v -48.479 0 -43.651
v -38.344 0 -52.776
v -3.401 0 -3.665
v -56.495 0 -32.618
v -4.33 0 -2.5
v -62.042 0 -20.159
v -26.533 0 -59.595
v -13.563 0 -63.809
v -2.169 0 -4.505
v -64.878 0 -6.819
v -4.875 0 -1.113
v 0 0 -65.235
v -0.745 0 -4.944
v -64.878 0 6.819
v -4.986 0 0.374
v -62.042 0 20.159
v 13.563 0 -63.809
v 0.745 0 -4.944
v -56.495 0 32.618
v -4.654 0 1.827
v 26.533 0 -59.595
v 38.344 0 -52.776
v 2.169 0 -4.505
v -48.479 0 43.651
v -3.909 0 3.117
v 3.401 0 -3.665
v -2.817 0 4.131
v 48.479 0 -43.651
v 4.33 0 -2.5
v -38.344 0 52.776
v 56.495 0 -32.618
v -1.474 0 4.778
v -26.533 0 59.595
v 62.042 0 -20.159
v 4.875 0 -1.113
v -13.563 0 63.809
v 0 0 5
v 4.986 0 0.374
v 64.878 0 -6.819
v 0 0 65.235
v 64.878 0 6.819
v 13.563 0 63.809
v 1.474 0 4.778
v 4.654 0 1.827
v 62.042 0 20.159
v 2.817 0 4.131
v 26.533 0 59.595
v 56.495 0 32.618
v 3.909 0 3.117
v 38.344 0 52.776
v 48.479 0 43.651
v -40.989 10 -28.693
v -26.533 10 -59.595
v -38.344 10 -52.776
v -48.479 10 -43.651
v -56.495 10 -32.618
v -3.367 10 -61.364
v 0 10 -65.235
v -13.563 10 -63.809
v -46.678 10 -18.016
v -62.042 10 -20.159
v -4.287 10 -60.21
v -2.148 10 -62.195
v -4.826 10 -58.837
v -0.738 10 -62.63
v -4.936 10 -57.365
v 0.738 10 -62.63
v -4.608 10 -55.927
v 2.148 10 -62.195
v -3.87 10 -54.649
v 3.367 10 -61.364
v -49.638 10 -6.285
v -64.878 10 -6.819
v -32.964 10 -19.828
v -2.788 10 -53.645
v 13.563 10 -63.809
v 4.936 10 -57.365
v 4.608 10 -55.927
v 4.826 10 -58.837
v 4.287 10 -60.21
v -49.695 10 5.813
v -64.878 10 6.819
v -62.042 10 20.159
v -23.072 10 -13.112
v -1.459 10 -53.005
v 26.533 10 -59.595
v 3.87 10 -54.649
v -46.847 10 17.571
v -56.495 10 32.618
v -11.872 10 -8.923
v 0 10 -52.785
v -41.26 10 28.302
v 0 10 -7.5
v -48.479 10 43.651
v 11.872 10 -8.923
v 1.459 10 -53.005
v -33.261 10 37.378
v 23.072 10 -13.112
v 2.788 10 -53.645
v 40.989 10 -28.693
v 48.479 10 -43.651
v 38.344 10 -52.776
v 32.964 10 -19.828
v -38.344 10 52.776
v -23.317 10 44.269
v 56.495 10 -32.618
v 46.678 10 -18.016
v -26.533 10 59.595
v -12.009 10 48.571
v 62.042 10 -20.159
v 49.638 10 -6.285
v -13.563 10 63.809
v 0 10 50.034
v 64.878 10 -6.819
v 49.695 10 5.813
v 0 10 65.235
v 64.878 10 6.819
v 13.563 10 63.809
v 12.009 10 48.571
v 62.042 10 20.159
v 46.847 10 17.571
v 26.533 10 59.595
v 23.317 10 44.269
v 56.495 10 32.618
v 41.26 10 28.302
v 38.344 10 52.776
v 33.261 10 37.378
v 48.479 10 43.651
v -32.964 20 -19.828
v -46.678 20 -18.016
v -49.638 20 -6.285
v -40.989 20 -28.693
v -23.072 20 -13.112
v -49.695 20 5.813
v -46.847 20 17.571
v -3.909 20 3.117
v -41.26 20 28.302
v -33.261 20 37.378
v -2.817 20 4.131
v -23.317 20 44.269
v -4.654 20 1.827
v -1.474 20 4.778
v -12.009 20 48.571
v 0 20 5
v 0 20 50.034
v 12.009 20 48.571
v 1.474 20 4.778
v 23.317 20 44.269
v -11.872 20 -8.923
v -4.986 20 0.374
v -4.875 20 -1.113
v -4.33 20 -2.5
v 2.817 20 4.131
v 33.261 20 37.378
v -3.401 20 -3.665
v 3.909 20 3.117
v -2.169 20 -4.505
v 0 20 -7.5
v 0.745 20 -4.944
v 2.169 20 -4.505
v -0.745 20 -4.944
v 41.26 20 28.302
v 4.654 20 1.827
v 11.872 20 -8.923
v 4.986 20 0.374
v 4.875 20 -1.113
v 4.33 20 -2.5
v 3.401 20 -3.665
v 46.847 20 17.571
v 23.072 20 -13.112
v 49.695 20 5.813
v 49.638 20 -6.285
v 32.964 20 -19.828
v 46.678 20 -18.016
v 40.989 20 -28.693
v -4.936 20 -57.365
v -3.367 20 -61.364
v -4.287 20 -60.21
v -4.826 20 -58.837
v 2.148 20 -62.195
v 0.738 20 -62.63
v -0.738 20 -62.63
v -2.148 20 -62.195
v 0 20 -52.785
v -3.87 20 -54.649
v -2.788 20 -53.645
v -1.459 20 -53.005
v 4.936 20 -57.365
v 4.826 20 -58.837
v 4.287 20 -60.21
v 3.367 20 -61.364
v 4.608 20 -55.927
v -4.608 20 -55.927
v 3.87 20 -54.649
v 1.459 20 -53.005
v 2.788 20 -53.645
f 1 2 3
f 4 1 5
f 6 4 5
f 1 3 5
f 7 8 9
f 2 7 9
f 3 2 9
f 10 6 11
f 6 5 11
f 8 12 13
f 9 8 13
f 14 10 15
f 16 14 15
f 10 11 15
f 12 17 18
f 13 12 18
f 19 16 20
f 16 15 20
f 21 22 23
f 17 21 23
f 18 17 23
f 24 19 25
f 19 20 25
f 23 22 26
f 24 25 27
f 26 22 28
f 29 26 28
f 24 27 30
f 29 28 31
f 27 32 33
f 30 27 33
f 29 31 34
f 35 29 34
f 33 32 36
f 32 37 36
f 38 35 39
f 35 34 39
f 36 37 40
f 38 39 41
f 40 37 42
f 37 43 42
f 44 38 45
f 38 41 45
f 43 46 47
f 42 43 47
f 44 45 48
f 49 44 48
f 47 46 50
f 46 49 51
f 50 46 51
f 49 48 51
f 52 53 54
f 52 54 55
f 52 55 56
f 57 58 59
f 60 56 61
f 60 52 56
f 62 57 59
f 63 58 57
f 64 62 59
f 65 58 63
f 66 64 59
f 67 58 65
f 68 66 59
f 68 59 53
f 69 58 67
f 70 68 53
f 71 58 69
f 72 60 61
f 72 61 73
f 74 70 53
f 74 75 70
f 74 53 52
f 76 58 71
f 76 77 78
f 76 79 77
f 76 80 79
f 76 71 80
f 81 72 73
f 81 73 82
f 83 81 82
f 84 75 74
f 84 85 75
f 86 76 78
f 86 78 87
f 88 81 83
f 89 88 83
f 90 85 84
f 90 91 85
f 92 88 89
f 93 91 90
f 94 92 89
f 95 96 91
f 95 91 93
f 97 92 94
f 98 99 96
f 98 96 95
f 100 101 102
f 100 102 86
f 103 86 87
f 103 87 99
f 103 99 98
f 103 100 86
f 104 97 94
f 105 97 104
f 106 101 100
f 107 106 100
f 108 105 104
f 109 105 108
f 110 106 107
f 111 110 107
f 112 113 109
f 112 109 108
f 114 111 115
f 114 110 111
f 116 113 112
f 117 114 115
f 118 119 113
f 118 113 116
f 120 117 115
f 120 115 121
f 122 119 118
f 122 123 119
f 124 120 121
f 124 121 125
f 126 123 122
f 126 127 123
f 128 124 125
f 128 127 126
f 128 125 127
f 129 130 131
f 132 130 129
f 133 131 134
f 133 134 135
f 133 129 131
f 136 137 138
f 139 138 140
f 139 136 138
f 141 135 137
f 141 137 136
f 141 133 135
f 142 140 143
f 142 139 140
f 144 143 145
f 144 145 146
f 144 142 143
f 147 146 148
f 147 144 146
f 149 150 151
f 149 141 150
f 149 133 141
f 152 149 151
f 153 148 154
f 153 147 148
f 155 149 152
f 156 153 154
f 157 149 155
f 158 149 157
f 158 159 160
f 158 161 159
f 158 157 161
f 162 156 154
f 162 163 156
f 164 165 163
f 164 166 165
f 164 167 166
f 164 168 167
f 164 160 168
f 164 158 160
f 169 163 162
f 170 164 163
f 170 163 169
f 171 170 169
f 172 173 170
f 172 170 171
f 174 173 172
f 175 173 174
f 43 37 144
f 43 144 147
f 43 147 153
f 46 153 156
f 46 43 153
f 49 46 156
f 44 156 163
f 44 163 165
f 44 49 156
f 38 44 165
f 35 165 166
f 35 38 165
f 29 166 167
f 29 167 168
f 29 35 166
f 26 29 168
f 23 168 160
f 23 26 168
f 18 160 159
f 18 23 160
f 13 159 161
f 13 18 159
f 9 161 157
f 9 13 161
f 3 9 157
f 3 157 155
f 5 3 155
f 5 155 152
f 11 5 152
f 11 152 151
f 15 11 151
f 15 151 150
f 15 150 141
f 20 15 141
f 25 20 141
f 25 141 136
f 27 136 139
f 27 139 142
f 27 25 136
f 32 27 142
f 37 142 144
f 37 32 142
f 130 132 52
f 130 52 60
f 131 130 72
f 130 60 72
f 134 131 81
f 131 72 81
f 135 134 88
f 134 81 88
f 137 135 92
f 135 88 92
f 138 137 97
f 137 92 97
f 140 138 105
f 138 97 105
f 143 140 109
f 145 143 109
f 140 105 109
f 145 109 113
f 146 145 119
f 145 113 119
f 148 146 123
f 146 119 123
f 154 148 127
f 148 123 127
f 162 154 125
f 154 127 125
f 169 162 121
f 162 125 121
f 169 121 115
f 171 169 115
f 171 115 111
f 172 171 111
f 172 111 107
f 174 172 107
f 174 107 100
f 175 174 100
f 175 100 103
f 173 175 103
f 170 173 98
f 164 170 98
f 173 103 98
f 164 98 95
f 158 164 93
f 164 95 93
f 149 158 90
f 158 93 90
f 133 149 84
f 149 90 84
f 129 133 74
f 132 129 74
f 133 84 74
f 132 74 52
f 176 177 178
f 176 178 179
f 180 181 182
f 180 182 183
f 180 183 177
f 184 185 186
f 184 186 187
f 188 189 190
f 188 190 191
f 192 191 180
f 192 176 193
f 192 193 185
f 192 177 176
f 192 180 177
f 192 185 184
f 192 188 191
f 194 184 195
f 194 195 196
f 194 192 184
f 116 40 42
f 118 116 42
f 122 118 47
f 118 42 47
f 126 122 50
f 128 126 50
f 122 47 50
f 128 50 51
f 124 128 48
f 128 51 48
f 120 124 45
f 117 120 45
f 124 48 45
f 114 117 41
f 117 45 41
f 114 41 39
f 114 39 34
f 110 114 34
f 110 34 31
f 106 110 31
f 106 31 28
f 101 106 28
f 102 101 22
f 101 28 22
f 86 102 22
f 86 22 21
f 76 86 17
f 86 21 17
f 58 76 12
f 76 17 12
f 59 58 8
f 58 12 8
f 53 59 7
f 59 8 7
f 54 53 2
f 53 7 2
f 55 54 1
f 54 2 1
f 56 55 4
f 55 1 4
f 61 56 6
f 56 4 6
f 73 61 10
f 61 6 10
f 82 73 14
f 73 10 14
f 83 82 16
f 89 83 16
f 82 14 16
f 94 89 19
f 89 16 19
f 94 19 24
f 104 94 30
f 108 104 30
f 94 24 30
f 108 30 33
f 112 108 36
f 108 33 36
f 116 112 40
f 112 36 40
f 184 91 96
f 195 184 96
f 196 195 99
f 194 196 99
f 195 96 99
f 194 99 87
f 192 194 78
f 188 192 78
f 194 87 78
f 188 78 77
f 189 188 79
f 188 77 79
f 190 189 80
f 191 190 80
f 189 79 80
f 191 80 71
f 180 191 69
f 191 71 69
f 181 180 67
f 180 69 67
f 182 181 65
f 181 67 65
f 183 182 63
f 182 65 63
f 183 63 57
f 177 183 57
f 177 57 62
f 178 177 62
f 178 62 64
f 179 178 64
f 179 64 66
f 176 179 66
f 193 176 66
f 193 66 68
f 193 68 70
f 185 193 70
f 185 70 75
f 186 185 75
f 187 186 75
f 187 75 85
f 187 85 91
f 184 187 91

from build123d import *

# Parameters (mm, degrees)
SKETCH1_R           = 65.235026919
SKETCH1_R_2         = 4.95
BOSS_EXTRUDE4_DEPTH = 10
SKETCH1_5_R         = 4.95
SKETCH1_5_R_2       = 5
BOSS_EXTRUDE5_DEPTH = 20


with BuildPart() as part:
    # Sketch1 → Boss-Extrude4 (new body)
    with BuildSketch(Plane(origin=(0, 0, 0), x_dir=(1, 0, 0), z_dir=(0, 1, 0))):
        with Locations(Location((0, 0, 0), (0, 0, 270))):  # turned: the seam where the file's is
            Circle(SKETCH1_R)
        with Locations(Location((0, 57.735026919, 0), (0, 0, 270))):  # turned: the seam where the file's is
            Circle(SKETCH1_R_2, mode=Mode.SUBTRACT)
        with BuildLine():
            ThreePointArc((-40.989114073, 28.69280839), (0, -50.033835809), (40.989114073, 28.69280839))
            ThreePointArc((40.989114073, 28.69280839), (0, 7.5), (-40.989114073, 28.69280839))
        make_face(mode=Mode.SUBTRACT)
    extrude(amount=BOSS_EXTRUDE4_DEPTH)

    # Sketch1_5 → Boss-Extrude5 (add)
    with BuildSketch(Plane(origin=(0, 0, 0), x_dir=(1, 0, 0), z_dir=(0, 1, 0))):
        with Locations(Location((0, 57.735026919, 0), (0, 0, 270))):  # turned: the seam where the file's is
            Circle(SKETCH1_5_R)
        with BuildLine():
            ThreePointArc((-40.989114073, 28.69280839), (0, -50.033835809), (40.989114073, 28.69280839))
            ThreePointArc((40.989114073, 28.69280839), (0, 7.5), (-40.989114073, 28.69280839))
        make_face()
        with Locations(Location((0, 0, 0), (0, 0, 270))):  # turned: the seam where the file's is
            Circle(SKETCH1_5_R_2, mode=Mode.SUBTRACT)
    extrude(amount=BOSS_EXTRUDE5_DEPTH)


solid = part.part
